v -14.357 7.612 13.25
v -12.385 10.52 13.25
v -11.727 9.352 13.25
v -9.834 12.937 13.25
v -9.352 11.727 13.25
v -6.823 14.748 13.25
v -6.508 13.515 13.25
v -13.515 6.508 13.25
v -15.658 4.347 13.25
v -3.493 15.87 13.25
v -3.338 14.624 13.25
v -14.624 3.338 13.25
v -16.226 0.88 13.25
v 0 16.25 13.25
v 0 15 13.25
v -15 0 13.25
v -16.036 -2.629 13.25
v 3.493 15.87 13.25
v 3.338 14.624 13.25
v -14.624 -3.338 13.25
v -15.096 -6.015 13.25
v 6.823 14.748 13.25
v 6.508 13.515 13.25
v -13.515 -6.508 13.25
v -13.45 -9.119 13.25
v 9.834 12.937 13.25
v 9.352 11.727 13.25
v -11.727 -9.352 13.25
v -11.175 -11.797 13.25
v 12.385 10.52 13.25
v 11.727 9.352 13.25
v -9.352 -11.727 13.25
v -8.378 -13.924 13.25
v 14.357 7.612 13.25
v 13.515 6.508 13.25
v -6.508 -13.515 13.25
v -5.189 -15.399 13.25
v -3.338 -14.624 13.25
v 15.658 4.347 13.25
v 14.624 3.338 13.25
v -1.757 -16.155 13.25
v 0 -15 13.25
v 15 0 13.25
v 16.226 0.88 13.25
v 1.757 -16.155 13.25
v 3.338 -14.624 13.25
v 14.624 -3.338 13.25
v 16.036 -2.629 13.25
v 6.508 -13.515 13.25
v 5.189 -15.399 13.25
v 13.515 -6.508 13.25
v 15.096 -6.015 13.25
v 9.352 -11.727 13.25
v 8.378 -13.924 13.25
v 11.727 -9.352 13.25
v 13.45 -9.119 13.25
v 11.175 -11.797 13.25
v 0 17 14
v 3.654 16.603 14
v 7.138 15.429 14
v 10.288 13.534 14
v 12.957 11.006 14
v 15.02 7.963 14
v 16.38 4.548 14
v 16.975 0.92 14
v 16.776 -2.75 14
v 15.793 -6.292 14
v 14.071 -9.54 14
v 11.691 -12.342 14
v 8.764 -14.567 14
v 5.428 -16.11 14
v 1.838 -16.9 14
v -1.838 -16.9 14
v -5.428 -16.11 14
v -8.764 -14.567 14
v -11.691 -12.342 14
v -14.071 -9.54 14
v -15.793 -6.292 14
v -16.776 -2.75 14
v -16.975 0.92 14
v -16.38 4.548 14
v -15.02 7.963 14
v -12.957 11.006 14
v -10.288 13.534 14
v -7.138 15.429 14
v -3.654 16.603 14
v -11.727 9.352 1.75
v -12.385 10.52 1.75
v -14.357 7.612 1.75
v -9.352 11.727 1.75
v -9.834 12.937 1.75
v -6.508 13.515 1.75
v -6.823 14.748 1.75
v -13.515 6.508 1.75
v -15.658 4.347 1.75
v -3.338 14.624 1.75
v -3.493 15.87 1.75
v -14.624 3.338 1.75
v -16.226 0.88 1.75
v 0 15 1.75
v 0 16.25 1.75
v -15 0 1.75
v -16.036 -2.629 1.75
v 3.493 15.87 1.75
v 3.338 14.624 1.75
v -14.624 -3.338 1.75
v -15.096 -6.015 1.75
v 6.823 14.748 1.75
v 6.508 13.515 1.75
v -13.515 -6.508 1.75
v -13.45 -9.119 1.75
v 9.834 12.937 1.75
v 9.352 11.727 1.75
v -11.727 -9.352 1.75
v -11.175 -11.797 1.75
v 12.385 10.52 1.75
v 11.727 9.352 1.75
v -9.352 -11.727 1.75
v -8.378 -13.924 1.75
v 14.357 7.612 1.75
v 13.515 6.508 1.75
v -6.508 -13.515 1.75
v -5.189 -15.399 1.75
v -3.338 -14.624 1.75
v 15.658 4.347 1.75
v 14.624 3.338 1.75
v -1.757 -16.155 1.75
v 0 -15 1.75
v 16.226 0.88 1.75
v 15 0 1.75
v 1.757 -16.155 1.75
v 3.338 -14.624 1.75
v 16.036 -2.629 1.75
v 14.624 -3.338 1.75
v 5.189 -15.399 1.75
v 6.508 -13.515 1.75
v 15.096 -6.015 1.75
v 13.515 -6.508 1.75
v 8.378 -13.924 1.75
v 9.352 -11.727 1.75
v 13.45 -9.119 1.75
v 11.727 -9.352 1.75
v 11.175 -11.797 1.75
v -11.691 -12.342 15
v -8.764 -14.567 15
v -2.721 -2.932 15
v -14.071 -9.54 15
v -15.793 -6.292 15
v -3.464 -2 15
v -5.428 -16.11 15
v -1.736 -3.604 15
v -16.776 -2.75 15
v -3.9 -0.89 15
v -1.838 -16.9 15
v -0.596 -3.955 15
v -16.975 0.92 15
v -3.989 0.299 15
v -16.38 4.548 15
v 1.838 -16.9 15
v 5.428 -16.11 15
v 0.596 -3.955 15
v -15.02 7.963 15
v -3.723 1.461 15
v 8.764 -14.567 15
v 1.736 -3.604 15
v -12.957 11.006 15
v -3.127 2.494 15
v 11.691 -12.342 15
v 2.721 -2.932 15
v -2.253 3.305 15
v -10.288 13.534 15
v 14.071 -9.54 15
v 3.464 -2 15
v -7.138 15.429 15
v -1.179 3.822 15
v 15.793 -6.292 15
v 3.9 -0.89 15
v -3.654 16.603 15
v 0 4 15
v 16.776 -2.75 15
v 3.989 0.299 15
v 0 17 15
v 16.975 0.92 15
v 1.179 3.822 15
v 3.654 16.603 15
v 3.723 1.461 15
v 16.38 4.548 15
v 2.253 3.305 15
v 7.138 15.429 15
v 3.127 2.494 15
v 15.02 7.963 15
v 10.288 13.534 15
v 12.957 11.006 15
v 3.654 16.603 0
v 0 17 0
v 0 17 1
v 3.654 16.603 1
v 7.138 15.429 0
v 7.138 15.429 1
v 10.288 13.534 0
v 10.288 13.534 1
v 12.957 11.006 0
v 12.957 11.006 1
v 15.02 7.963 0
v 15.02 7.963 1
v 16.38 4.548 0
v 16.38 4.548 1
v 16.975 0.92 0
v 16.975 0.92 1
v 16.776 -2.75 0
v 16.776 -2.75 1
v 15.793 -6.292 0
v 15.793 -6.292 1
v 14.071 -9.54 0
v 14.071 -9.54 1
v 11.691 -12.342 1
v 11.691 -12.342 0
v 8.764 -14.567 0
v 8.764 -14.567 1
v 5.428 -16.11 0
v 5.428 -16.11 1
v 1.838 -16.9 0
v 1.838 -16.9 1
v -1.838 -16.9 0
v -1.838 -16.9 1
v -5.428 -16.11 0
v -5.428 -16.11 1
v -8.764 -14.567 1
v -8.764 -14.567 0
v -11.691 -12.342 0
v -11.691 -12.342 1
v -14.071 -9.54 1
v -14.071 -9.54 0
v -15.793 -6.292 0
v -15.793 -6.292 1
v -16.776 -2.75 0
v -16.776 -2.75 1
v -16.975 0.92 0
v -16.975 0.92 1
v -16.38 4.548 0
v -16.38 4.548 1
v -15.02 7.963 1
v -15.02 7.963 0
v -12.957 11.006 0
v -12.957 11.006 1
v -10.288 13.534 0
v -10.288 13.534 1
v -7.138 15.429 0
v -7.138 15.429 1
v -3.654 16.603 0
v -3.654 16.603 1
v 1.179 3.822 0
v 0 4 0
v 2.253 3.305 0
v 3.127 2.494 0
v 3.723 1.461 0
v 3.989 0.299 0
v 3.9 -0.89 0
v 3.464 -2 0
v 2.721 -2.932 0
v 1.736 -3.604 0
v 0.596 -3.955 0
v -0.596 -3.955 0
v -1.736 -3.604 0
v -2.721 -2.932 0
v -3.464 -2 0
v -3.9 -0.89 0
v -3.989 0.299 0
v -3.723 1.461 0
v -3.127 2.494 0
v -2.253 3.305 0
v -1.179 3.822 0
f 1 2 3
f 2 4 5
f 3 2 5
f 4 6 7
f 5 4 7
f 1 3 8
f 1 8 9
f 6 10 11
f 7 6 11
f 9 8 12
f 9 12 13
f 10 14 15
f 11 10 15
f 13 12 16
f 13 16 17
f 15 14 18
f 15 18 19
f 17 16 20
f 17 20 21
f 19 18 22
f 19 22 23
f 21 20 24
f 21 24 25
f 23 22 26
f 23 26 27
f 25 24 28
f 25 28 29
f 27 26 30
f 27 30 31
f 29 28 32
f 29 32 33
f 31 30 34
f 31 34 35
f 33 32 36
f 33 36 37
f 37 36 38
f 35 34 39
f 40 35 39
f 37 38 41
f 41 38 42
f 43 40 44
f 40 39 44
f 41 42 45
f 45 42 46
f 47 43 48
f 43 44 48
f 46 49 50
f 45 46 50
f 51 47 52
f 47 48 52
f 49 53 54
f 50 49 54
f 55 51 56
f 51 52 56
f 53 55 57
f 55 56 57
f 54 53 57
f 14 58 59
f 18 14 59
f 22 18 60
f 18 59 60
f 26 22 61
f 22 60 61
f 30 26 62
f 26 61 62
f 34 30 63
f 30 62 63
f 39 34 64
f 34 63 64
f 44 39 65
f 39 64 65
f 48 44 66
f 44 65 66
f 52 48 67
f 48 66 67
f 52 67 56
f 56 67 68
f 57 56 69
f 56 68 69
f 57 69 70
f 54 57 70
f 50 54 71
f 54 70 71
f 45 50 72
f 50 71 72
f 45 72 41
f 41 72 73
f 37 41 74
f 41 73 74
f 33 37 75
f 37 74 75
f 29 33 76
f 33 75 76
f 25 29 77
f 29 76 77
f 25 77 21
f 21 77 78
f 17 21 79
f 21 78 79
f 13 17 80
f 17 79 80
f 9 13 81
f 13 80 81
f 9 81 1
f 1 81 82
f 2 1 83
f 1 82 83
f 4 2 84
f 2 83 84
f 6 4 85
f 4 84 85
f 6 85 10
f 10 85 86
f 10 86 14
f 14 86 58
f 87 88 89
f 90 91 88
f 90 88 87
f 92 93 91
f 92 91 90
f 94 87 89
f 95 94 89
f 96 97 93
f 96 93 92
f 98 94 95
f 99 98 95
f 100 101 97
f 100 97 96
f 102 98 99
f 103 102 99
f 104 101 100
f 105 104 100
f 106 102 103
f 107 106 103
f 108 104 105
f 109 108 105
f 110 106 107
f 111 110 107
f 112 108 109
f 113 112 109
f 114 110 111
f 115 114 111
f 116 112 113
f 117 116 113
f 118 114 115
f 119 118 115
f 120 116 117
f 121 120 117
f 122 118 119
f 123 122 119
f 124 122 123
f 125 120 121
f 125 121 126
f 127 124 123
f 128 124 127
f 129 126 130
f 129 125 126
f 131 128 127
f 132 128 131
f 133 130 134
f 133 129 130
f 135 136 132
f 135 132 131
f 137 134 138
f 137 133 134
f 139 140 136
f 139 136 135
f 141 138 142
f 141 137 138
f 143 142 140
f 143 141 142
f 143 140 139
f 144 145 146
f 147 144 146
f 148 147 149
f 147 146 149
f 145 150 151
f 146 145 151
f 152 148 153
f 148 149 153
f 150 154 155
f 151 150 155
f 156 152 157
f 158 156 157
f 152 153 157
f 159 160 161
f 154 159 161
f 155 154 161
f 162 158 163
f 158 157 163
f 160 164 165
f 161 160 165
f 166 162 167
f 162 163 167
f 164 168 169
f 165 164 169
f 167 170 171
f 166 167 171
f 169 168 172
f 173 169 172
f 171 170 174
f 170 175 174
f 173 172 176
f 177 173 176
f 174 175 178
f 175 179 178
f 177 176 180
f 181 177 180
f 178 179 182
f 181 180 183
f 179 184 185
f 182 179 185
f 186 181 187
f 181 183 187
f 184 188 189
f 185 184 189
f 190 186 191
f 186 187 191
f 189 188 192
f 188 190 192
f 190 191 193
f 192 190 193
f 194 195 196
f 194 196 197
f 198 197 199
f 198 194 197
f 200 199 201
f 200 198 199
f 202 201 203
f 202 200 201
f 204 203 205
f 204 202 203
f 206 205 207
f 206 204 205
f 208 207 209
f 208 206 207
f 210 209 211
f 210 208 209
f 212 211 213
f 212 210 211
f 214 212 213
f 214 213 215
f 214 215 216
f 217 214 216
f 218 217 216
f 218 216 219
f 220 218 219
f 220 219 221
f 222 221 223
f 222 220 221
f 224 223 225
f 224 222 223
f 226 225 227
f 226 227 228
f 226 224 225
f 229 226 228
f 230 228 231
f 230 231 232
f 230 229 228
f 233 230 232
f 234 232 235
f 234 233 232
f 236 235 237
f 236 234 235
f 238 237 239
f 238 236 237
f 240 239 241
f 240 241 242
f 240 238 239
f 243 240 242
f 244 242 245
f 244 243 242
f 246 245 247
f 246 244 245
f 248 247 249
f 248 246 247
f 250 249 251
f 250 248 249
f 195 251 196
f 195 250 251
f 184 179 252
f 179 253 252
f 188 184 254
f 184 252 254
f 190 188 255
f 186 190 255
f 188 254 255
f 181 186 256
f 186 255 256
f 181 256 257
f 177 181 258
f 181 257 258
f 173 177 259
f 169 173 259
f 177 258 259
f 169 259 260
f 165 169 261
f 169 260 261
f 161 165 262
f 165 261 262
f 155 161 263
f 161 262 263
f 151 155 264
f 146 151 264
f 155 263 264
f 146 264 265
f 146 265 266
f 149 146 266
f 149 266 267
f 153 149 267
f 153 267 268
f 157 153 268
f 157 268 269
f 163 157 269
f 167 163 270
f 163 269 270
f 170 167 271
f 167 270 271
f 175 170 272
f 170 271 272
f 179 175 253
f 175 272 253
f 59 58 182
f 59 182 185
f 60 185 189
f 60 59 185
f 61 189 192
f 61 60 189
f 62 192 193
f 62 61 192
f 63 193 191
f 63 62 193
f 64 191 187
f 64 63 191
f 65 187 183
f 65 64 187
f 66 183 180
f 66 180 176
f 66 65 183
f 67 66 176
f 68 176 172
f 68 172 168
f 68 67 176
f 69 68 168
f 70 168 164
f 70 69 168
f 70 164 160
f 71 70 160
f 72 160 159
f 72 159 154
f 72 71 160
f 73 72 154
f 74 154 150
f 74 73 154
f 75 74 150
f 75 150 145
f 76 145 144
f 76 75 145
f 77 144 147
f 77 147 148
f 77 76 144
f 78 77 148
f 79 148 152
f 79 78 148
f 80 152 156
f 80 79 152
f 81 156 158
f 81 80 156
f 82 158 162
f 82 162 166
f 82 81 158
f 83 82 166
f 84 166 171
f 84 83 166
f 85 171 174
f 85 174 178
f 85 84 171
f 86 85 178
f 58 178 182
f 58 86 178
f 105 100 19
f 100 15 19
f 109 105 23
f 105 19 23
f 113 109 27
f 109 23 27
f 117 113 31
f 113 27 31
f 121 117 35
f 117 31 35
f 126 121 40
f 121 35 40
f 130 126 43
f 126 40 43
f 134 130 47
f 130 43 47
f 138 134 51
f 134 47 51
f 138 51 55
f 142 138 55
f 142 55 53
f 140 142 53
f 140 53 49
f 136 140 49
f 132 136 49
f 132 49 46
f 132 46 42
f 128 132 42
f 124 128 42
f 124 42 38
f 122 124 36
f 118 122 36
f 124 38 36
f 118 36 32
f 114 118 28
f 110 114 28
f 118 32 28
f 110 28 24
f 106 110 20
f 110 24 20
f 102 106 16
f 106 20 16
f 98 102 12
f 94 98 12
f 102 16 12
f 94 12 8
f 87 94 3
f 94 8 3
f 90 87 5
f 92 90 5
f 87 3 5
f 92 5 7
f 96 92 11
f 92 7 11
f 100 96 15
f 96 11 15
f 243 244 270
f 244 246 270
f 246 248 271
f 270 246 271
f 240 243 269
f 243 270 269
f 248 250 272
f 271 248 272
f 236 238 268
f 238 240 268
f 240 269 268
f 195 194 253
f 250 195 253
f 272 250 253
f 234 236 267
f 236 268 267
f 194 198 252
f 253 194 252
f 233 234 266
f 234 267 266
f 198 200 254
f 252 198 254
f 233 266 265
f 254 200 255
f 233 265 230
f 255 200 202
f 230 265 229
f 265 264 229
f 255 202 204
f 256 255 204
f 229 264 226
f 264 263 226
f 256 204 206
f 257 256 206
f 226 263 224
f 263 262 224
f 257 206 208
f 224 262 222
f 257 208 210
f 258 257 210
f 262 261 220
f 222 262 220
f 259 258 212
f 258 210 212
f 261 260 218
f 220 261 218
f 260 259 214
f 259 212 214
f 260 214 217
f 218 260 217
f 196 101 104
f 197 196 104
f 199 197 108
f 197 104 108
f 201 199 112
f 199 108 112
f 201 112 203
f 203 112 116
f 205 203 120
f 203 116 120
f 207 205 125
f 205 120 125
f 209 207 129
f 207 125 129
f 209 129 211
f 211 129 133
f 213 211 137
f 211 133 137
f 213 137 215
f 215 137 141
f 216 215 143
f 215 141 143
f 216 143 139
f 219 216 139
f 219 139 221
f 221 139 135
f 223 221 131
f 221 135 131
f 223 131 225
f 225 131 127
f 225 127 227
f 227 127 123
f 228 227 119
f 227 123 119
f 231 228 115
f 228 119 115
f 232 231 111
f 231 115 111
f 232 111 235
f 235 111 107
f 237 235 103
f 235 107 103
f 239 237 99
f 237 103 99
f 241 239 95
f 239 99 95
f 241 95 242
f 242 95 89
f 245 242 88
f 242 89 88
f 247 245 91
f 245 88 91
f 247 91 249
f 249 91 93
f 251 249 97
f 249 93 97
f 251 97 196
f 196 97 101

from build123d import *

# Parameters (mm, degrees)
ESQUISSE1_W     = 1.75
ESQUISSE1_H     = 2
ESQUISSE1_W_2   = 15
ESQUISSE1_H_2   = 7
CHANFREIN1_SIZE = 0.75


with BuildPart() as part:
    # Esquisse1 → Révolution1 (revolve)
    with BuildSketch(Plane(origin=(0, 0, 0), x_dir=(0, 0, -1), z_dir=(1, 0, 0))):
        Polygon((-15, 15), (-15, 11), (0, 11), (0, 15), (-1.75, 15), (-13.25, 15), align=None)
        with Locations((-14.125, 16)):
            Rectangle(ESQUISSE1_W, ESQUISSE1_H)
        with Locations((-0.875, 16)):
            Rectangle(ESQUISSE1_W, ESQUISSE1_H)
        with Locations((-7.5, 7.5)):
            Rectangle(ESQUISSE1_W_2, ESQUISSE1_H_2)
    revolve(axis=Axis((0, 0, 15), (0, 0, -1)))

    # Chanfrein1
    chanfrein1_edges = [part.edges().sort_by_distance(p)[0] for p in [
        (0, -17, 1.75),
        (0, -17, 13.25),
    ]]
    chamfer(chanfrein1_edges, length=CHANFREIN1_SIZE)


solid = part.part
